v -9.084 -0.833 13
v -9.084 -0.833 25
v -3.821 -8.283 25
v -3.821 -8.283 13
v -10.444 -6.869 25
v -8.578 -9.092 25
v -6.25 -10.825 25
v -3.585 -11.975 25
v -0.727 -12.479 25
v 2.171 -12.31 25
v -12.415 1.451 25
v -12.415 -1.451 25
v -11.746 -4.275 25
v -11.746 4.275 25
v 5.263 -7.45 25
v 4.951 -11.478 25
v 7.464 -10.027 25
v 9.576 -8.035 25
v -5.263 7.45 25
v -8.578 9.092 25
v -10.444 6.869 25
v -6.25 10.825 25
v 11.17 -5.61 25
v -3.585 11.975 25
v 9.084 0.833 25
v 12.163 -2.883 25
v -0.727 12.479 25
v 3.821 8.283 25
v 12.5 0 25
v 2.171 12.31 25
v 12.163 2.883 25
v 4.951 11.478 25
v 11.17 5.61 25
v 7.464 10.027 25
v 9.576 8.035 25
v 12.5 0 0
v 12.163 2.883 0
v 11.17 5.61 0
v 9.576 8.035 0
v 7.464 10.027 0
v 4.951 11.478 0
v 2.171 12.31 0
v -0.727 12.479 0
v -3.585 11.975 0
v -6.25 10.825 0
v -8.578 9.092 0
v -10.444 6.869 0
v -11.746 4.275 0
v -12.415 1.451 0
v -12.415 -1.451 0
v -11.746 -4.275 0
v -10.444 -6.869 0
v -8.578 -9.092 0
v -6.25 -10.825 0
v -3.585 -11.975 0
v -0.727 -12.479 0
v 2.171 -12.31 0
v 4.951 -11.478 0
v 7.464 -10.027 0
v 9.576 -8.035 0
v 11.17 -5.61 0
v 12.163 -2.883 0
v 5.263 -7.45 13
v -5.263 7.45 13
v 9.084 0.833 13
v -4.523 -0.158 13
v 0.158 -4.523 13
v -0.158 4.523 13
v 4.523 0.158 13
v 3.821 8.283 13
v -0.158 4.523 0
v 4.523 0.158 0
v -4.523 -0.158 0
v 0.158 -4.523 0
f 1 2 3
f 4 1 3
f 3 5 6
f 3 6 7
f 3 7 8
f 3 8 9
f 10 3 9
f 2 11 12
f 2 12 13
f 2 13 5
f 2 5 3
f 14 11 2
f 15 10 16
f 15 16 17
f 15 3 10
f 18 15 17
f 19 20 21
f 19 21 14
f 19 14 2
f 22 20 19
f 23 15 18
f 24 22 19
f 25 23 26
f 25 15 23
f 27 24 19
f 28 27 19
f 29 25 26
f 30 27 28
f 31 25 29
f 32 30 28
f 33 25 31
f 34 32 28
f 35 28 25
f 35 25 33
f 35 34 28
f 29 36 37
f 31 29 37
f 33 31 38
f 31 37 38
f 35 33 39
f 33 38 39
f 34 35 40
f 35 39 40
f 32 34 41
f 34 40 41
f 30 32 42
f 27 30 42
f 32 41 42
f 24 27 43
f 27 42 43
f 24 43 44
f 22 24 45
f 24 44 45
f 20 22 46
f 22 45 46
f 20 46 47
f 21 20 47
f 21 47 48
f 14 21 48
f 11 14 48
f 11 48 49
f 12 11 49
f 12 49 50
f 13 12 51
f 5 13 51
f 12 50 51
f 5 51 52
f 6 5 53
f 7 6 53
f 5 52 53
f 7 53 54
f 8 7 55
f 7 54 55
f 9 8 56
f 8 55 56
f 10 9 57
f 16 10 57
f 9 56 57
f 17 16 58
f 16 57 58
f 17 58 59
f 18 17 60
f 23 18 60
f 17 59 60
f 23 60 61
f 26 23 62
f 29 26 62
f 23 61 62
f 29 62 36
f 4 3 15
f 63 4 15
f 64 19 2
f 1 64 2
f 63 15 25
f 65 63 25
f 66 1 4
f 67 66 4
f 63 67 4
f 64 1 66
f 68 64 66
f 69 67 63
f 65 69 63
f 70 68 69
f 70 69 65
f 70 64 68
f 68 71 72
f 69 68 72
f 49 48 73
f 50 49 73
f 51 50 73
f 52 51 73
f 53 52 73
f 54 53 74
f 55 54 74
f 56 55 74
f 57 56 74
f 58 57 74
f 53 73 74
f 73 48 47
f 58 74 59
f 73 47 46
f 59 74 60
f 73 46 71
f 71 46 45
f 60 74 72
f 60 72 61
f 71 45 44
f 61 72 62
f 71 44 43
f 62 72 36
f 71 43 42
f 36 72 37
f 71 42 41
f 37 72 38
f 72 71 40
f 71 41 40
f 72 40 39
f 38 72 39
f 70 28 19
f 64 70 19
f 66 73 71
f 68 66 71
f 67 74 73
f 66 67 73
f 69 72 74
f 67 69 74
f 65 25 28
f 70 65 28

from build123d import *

# Parameters (mm, degrees)
F0_R     = 12.5
F1_DEPTH = 25
F3_DEPTH = 12
F5_DEPTH = 25


with BuildPart() as f1:
    # F0 (on Top) → F1 (new body)
    with BuildSketch(Plane.XY):
        Circle(F0_R)
    extrude(amount=F1_DEPTH)

    # F2 (on face) → F3 (cut)
    with BuildSketch(Plane.XY.offset(25)):
        Polygon((-9.084021, -0.833007), (-3.820606, -8.283496), (5.263415, -7.450489), (9.084021, 0.833007), (3.820606, 8.283496), (-5.263415, 7.450489), align=None)
    extrude(amount=-F3_DEPTH, mode=Mode.SUBTRACT)

    # F4 (on face) → F5 (cut)
    with BuildSketch(Plane(origin=(0, 0, 0), x_dir=(1, 0, 0), z_dir=(0, 0, -1))):
        Polygon((0.158226, 4.522716), (-4.522716, 0.158226), (-0.158226, -4.522716), (4.522716, -0.158226), align=None)
    extrude(amount=-F5_DEPTH, mode=Mode.SUBTRACT)


solid = f1.part
